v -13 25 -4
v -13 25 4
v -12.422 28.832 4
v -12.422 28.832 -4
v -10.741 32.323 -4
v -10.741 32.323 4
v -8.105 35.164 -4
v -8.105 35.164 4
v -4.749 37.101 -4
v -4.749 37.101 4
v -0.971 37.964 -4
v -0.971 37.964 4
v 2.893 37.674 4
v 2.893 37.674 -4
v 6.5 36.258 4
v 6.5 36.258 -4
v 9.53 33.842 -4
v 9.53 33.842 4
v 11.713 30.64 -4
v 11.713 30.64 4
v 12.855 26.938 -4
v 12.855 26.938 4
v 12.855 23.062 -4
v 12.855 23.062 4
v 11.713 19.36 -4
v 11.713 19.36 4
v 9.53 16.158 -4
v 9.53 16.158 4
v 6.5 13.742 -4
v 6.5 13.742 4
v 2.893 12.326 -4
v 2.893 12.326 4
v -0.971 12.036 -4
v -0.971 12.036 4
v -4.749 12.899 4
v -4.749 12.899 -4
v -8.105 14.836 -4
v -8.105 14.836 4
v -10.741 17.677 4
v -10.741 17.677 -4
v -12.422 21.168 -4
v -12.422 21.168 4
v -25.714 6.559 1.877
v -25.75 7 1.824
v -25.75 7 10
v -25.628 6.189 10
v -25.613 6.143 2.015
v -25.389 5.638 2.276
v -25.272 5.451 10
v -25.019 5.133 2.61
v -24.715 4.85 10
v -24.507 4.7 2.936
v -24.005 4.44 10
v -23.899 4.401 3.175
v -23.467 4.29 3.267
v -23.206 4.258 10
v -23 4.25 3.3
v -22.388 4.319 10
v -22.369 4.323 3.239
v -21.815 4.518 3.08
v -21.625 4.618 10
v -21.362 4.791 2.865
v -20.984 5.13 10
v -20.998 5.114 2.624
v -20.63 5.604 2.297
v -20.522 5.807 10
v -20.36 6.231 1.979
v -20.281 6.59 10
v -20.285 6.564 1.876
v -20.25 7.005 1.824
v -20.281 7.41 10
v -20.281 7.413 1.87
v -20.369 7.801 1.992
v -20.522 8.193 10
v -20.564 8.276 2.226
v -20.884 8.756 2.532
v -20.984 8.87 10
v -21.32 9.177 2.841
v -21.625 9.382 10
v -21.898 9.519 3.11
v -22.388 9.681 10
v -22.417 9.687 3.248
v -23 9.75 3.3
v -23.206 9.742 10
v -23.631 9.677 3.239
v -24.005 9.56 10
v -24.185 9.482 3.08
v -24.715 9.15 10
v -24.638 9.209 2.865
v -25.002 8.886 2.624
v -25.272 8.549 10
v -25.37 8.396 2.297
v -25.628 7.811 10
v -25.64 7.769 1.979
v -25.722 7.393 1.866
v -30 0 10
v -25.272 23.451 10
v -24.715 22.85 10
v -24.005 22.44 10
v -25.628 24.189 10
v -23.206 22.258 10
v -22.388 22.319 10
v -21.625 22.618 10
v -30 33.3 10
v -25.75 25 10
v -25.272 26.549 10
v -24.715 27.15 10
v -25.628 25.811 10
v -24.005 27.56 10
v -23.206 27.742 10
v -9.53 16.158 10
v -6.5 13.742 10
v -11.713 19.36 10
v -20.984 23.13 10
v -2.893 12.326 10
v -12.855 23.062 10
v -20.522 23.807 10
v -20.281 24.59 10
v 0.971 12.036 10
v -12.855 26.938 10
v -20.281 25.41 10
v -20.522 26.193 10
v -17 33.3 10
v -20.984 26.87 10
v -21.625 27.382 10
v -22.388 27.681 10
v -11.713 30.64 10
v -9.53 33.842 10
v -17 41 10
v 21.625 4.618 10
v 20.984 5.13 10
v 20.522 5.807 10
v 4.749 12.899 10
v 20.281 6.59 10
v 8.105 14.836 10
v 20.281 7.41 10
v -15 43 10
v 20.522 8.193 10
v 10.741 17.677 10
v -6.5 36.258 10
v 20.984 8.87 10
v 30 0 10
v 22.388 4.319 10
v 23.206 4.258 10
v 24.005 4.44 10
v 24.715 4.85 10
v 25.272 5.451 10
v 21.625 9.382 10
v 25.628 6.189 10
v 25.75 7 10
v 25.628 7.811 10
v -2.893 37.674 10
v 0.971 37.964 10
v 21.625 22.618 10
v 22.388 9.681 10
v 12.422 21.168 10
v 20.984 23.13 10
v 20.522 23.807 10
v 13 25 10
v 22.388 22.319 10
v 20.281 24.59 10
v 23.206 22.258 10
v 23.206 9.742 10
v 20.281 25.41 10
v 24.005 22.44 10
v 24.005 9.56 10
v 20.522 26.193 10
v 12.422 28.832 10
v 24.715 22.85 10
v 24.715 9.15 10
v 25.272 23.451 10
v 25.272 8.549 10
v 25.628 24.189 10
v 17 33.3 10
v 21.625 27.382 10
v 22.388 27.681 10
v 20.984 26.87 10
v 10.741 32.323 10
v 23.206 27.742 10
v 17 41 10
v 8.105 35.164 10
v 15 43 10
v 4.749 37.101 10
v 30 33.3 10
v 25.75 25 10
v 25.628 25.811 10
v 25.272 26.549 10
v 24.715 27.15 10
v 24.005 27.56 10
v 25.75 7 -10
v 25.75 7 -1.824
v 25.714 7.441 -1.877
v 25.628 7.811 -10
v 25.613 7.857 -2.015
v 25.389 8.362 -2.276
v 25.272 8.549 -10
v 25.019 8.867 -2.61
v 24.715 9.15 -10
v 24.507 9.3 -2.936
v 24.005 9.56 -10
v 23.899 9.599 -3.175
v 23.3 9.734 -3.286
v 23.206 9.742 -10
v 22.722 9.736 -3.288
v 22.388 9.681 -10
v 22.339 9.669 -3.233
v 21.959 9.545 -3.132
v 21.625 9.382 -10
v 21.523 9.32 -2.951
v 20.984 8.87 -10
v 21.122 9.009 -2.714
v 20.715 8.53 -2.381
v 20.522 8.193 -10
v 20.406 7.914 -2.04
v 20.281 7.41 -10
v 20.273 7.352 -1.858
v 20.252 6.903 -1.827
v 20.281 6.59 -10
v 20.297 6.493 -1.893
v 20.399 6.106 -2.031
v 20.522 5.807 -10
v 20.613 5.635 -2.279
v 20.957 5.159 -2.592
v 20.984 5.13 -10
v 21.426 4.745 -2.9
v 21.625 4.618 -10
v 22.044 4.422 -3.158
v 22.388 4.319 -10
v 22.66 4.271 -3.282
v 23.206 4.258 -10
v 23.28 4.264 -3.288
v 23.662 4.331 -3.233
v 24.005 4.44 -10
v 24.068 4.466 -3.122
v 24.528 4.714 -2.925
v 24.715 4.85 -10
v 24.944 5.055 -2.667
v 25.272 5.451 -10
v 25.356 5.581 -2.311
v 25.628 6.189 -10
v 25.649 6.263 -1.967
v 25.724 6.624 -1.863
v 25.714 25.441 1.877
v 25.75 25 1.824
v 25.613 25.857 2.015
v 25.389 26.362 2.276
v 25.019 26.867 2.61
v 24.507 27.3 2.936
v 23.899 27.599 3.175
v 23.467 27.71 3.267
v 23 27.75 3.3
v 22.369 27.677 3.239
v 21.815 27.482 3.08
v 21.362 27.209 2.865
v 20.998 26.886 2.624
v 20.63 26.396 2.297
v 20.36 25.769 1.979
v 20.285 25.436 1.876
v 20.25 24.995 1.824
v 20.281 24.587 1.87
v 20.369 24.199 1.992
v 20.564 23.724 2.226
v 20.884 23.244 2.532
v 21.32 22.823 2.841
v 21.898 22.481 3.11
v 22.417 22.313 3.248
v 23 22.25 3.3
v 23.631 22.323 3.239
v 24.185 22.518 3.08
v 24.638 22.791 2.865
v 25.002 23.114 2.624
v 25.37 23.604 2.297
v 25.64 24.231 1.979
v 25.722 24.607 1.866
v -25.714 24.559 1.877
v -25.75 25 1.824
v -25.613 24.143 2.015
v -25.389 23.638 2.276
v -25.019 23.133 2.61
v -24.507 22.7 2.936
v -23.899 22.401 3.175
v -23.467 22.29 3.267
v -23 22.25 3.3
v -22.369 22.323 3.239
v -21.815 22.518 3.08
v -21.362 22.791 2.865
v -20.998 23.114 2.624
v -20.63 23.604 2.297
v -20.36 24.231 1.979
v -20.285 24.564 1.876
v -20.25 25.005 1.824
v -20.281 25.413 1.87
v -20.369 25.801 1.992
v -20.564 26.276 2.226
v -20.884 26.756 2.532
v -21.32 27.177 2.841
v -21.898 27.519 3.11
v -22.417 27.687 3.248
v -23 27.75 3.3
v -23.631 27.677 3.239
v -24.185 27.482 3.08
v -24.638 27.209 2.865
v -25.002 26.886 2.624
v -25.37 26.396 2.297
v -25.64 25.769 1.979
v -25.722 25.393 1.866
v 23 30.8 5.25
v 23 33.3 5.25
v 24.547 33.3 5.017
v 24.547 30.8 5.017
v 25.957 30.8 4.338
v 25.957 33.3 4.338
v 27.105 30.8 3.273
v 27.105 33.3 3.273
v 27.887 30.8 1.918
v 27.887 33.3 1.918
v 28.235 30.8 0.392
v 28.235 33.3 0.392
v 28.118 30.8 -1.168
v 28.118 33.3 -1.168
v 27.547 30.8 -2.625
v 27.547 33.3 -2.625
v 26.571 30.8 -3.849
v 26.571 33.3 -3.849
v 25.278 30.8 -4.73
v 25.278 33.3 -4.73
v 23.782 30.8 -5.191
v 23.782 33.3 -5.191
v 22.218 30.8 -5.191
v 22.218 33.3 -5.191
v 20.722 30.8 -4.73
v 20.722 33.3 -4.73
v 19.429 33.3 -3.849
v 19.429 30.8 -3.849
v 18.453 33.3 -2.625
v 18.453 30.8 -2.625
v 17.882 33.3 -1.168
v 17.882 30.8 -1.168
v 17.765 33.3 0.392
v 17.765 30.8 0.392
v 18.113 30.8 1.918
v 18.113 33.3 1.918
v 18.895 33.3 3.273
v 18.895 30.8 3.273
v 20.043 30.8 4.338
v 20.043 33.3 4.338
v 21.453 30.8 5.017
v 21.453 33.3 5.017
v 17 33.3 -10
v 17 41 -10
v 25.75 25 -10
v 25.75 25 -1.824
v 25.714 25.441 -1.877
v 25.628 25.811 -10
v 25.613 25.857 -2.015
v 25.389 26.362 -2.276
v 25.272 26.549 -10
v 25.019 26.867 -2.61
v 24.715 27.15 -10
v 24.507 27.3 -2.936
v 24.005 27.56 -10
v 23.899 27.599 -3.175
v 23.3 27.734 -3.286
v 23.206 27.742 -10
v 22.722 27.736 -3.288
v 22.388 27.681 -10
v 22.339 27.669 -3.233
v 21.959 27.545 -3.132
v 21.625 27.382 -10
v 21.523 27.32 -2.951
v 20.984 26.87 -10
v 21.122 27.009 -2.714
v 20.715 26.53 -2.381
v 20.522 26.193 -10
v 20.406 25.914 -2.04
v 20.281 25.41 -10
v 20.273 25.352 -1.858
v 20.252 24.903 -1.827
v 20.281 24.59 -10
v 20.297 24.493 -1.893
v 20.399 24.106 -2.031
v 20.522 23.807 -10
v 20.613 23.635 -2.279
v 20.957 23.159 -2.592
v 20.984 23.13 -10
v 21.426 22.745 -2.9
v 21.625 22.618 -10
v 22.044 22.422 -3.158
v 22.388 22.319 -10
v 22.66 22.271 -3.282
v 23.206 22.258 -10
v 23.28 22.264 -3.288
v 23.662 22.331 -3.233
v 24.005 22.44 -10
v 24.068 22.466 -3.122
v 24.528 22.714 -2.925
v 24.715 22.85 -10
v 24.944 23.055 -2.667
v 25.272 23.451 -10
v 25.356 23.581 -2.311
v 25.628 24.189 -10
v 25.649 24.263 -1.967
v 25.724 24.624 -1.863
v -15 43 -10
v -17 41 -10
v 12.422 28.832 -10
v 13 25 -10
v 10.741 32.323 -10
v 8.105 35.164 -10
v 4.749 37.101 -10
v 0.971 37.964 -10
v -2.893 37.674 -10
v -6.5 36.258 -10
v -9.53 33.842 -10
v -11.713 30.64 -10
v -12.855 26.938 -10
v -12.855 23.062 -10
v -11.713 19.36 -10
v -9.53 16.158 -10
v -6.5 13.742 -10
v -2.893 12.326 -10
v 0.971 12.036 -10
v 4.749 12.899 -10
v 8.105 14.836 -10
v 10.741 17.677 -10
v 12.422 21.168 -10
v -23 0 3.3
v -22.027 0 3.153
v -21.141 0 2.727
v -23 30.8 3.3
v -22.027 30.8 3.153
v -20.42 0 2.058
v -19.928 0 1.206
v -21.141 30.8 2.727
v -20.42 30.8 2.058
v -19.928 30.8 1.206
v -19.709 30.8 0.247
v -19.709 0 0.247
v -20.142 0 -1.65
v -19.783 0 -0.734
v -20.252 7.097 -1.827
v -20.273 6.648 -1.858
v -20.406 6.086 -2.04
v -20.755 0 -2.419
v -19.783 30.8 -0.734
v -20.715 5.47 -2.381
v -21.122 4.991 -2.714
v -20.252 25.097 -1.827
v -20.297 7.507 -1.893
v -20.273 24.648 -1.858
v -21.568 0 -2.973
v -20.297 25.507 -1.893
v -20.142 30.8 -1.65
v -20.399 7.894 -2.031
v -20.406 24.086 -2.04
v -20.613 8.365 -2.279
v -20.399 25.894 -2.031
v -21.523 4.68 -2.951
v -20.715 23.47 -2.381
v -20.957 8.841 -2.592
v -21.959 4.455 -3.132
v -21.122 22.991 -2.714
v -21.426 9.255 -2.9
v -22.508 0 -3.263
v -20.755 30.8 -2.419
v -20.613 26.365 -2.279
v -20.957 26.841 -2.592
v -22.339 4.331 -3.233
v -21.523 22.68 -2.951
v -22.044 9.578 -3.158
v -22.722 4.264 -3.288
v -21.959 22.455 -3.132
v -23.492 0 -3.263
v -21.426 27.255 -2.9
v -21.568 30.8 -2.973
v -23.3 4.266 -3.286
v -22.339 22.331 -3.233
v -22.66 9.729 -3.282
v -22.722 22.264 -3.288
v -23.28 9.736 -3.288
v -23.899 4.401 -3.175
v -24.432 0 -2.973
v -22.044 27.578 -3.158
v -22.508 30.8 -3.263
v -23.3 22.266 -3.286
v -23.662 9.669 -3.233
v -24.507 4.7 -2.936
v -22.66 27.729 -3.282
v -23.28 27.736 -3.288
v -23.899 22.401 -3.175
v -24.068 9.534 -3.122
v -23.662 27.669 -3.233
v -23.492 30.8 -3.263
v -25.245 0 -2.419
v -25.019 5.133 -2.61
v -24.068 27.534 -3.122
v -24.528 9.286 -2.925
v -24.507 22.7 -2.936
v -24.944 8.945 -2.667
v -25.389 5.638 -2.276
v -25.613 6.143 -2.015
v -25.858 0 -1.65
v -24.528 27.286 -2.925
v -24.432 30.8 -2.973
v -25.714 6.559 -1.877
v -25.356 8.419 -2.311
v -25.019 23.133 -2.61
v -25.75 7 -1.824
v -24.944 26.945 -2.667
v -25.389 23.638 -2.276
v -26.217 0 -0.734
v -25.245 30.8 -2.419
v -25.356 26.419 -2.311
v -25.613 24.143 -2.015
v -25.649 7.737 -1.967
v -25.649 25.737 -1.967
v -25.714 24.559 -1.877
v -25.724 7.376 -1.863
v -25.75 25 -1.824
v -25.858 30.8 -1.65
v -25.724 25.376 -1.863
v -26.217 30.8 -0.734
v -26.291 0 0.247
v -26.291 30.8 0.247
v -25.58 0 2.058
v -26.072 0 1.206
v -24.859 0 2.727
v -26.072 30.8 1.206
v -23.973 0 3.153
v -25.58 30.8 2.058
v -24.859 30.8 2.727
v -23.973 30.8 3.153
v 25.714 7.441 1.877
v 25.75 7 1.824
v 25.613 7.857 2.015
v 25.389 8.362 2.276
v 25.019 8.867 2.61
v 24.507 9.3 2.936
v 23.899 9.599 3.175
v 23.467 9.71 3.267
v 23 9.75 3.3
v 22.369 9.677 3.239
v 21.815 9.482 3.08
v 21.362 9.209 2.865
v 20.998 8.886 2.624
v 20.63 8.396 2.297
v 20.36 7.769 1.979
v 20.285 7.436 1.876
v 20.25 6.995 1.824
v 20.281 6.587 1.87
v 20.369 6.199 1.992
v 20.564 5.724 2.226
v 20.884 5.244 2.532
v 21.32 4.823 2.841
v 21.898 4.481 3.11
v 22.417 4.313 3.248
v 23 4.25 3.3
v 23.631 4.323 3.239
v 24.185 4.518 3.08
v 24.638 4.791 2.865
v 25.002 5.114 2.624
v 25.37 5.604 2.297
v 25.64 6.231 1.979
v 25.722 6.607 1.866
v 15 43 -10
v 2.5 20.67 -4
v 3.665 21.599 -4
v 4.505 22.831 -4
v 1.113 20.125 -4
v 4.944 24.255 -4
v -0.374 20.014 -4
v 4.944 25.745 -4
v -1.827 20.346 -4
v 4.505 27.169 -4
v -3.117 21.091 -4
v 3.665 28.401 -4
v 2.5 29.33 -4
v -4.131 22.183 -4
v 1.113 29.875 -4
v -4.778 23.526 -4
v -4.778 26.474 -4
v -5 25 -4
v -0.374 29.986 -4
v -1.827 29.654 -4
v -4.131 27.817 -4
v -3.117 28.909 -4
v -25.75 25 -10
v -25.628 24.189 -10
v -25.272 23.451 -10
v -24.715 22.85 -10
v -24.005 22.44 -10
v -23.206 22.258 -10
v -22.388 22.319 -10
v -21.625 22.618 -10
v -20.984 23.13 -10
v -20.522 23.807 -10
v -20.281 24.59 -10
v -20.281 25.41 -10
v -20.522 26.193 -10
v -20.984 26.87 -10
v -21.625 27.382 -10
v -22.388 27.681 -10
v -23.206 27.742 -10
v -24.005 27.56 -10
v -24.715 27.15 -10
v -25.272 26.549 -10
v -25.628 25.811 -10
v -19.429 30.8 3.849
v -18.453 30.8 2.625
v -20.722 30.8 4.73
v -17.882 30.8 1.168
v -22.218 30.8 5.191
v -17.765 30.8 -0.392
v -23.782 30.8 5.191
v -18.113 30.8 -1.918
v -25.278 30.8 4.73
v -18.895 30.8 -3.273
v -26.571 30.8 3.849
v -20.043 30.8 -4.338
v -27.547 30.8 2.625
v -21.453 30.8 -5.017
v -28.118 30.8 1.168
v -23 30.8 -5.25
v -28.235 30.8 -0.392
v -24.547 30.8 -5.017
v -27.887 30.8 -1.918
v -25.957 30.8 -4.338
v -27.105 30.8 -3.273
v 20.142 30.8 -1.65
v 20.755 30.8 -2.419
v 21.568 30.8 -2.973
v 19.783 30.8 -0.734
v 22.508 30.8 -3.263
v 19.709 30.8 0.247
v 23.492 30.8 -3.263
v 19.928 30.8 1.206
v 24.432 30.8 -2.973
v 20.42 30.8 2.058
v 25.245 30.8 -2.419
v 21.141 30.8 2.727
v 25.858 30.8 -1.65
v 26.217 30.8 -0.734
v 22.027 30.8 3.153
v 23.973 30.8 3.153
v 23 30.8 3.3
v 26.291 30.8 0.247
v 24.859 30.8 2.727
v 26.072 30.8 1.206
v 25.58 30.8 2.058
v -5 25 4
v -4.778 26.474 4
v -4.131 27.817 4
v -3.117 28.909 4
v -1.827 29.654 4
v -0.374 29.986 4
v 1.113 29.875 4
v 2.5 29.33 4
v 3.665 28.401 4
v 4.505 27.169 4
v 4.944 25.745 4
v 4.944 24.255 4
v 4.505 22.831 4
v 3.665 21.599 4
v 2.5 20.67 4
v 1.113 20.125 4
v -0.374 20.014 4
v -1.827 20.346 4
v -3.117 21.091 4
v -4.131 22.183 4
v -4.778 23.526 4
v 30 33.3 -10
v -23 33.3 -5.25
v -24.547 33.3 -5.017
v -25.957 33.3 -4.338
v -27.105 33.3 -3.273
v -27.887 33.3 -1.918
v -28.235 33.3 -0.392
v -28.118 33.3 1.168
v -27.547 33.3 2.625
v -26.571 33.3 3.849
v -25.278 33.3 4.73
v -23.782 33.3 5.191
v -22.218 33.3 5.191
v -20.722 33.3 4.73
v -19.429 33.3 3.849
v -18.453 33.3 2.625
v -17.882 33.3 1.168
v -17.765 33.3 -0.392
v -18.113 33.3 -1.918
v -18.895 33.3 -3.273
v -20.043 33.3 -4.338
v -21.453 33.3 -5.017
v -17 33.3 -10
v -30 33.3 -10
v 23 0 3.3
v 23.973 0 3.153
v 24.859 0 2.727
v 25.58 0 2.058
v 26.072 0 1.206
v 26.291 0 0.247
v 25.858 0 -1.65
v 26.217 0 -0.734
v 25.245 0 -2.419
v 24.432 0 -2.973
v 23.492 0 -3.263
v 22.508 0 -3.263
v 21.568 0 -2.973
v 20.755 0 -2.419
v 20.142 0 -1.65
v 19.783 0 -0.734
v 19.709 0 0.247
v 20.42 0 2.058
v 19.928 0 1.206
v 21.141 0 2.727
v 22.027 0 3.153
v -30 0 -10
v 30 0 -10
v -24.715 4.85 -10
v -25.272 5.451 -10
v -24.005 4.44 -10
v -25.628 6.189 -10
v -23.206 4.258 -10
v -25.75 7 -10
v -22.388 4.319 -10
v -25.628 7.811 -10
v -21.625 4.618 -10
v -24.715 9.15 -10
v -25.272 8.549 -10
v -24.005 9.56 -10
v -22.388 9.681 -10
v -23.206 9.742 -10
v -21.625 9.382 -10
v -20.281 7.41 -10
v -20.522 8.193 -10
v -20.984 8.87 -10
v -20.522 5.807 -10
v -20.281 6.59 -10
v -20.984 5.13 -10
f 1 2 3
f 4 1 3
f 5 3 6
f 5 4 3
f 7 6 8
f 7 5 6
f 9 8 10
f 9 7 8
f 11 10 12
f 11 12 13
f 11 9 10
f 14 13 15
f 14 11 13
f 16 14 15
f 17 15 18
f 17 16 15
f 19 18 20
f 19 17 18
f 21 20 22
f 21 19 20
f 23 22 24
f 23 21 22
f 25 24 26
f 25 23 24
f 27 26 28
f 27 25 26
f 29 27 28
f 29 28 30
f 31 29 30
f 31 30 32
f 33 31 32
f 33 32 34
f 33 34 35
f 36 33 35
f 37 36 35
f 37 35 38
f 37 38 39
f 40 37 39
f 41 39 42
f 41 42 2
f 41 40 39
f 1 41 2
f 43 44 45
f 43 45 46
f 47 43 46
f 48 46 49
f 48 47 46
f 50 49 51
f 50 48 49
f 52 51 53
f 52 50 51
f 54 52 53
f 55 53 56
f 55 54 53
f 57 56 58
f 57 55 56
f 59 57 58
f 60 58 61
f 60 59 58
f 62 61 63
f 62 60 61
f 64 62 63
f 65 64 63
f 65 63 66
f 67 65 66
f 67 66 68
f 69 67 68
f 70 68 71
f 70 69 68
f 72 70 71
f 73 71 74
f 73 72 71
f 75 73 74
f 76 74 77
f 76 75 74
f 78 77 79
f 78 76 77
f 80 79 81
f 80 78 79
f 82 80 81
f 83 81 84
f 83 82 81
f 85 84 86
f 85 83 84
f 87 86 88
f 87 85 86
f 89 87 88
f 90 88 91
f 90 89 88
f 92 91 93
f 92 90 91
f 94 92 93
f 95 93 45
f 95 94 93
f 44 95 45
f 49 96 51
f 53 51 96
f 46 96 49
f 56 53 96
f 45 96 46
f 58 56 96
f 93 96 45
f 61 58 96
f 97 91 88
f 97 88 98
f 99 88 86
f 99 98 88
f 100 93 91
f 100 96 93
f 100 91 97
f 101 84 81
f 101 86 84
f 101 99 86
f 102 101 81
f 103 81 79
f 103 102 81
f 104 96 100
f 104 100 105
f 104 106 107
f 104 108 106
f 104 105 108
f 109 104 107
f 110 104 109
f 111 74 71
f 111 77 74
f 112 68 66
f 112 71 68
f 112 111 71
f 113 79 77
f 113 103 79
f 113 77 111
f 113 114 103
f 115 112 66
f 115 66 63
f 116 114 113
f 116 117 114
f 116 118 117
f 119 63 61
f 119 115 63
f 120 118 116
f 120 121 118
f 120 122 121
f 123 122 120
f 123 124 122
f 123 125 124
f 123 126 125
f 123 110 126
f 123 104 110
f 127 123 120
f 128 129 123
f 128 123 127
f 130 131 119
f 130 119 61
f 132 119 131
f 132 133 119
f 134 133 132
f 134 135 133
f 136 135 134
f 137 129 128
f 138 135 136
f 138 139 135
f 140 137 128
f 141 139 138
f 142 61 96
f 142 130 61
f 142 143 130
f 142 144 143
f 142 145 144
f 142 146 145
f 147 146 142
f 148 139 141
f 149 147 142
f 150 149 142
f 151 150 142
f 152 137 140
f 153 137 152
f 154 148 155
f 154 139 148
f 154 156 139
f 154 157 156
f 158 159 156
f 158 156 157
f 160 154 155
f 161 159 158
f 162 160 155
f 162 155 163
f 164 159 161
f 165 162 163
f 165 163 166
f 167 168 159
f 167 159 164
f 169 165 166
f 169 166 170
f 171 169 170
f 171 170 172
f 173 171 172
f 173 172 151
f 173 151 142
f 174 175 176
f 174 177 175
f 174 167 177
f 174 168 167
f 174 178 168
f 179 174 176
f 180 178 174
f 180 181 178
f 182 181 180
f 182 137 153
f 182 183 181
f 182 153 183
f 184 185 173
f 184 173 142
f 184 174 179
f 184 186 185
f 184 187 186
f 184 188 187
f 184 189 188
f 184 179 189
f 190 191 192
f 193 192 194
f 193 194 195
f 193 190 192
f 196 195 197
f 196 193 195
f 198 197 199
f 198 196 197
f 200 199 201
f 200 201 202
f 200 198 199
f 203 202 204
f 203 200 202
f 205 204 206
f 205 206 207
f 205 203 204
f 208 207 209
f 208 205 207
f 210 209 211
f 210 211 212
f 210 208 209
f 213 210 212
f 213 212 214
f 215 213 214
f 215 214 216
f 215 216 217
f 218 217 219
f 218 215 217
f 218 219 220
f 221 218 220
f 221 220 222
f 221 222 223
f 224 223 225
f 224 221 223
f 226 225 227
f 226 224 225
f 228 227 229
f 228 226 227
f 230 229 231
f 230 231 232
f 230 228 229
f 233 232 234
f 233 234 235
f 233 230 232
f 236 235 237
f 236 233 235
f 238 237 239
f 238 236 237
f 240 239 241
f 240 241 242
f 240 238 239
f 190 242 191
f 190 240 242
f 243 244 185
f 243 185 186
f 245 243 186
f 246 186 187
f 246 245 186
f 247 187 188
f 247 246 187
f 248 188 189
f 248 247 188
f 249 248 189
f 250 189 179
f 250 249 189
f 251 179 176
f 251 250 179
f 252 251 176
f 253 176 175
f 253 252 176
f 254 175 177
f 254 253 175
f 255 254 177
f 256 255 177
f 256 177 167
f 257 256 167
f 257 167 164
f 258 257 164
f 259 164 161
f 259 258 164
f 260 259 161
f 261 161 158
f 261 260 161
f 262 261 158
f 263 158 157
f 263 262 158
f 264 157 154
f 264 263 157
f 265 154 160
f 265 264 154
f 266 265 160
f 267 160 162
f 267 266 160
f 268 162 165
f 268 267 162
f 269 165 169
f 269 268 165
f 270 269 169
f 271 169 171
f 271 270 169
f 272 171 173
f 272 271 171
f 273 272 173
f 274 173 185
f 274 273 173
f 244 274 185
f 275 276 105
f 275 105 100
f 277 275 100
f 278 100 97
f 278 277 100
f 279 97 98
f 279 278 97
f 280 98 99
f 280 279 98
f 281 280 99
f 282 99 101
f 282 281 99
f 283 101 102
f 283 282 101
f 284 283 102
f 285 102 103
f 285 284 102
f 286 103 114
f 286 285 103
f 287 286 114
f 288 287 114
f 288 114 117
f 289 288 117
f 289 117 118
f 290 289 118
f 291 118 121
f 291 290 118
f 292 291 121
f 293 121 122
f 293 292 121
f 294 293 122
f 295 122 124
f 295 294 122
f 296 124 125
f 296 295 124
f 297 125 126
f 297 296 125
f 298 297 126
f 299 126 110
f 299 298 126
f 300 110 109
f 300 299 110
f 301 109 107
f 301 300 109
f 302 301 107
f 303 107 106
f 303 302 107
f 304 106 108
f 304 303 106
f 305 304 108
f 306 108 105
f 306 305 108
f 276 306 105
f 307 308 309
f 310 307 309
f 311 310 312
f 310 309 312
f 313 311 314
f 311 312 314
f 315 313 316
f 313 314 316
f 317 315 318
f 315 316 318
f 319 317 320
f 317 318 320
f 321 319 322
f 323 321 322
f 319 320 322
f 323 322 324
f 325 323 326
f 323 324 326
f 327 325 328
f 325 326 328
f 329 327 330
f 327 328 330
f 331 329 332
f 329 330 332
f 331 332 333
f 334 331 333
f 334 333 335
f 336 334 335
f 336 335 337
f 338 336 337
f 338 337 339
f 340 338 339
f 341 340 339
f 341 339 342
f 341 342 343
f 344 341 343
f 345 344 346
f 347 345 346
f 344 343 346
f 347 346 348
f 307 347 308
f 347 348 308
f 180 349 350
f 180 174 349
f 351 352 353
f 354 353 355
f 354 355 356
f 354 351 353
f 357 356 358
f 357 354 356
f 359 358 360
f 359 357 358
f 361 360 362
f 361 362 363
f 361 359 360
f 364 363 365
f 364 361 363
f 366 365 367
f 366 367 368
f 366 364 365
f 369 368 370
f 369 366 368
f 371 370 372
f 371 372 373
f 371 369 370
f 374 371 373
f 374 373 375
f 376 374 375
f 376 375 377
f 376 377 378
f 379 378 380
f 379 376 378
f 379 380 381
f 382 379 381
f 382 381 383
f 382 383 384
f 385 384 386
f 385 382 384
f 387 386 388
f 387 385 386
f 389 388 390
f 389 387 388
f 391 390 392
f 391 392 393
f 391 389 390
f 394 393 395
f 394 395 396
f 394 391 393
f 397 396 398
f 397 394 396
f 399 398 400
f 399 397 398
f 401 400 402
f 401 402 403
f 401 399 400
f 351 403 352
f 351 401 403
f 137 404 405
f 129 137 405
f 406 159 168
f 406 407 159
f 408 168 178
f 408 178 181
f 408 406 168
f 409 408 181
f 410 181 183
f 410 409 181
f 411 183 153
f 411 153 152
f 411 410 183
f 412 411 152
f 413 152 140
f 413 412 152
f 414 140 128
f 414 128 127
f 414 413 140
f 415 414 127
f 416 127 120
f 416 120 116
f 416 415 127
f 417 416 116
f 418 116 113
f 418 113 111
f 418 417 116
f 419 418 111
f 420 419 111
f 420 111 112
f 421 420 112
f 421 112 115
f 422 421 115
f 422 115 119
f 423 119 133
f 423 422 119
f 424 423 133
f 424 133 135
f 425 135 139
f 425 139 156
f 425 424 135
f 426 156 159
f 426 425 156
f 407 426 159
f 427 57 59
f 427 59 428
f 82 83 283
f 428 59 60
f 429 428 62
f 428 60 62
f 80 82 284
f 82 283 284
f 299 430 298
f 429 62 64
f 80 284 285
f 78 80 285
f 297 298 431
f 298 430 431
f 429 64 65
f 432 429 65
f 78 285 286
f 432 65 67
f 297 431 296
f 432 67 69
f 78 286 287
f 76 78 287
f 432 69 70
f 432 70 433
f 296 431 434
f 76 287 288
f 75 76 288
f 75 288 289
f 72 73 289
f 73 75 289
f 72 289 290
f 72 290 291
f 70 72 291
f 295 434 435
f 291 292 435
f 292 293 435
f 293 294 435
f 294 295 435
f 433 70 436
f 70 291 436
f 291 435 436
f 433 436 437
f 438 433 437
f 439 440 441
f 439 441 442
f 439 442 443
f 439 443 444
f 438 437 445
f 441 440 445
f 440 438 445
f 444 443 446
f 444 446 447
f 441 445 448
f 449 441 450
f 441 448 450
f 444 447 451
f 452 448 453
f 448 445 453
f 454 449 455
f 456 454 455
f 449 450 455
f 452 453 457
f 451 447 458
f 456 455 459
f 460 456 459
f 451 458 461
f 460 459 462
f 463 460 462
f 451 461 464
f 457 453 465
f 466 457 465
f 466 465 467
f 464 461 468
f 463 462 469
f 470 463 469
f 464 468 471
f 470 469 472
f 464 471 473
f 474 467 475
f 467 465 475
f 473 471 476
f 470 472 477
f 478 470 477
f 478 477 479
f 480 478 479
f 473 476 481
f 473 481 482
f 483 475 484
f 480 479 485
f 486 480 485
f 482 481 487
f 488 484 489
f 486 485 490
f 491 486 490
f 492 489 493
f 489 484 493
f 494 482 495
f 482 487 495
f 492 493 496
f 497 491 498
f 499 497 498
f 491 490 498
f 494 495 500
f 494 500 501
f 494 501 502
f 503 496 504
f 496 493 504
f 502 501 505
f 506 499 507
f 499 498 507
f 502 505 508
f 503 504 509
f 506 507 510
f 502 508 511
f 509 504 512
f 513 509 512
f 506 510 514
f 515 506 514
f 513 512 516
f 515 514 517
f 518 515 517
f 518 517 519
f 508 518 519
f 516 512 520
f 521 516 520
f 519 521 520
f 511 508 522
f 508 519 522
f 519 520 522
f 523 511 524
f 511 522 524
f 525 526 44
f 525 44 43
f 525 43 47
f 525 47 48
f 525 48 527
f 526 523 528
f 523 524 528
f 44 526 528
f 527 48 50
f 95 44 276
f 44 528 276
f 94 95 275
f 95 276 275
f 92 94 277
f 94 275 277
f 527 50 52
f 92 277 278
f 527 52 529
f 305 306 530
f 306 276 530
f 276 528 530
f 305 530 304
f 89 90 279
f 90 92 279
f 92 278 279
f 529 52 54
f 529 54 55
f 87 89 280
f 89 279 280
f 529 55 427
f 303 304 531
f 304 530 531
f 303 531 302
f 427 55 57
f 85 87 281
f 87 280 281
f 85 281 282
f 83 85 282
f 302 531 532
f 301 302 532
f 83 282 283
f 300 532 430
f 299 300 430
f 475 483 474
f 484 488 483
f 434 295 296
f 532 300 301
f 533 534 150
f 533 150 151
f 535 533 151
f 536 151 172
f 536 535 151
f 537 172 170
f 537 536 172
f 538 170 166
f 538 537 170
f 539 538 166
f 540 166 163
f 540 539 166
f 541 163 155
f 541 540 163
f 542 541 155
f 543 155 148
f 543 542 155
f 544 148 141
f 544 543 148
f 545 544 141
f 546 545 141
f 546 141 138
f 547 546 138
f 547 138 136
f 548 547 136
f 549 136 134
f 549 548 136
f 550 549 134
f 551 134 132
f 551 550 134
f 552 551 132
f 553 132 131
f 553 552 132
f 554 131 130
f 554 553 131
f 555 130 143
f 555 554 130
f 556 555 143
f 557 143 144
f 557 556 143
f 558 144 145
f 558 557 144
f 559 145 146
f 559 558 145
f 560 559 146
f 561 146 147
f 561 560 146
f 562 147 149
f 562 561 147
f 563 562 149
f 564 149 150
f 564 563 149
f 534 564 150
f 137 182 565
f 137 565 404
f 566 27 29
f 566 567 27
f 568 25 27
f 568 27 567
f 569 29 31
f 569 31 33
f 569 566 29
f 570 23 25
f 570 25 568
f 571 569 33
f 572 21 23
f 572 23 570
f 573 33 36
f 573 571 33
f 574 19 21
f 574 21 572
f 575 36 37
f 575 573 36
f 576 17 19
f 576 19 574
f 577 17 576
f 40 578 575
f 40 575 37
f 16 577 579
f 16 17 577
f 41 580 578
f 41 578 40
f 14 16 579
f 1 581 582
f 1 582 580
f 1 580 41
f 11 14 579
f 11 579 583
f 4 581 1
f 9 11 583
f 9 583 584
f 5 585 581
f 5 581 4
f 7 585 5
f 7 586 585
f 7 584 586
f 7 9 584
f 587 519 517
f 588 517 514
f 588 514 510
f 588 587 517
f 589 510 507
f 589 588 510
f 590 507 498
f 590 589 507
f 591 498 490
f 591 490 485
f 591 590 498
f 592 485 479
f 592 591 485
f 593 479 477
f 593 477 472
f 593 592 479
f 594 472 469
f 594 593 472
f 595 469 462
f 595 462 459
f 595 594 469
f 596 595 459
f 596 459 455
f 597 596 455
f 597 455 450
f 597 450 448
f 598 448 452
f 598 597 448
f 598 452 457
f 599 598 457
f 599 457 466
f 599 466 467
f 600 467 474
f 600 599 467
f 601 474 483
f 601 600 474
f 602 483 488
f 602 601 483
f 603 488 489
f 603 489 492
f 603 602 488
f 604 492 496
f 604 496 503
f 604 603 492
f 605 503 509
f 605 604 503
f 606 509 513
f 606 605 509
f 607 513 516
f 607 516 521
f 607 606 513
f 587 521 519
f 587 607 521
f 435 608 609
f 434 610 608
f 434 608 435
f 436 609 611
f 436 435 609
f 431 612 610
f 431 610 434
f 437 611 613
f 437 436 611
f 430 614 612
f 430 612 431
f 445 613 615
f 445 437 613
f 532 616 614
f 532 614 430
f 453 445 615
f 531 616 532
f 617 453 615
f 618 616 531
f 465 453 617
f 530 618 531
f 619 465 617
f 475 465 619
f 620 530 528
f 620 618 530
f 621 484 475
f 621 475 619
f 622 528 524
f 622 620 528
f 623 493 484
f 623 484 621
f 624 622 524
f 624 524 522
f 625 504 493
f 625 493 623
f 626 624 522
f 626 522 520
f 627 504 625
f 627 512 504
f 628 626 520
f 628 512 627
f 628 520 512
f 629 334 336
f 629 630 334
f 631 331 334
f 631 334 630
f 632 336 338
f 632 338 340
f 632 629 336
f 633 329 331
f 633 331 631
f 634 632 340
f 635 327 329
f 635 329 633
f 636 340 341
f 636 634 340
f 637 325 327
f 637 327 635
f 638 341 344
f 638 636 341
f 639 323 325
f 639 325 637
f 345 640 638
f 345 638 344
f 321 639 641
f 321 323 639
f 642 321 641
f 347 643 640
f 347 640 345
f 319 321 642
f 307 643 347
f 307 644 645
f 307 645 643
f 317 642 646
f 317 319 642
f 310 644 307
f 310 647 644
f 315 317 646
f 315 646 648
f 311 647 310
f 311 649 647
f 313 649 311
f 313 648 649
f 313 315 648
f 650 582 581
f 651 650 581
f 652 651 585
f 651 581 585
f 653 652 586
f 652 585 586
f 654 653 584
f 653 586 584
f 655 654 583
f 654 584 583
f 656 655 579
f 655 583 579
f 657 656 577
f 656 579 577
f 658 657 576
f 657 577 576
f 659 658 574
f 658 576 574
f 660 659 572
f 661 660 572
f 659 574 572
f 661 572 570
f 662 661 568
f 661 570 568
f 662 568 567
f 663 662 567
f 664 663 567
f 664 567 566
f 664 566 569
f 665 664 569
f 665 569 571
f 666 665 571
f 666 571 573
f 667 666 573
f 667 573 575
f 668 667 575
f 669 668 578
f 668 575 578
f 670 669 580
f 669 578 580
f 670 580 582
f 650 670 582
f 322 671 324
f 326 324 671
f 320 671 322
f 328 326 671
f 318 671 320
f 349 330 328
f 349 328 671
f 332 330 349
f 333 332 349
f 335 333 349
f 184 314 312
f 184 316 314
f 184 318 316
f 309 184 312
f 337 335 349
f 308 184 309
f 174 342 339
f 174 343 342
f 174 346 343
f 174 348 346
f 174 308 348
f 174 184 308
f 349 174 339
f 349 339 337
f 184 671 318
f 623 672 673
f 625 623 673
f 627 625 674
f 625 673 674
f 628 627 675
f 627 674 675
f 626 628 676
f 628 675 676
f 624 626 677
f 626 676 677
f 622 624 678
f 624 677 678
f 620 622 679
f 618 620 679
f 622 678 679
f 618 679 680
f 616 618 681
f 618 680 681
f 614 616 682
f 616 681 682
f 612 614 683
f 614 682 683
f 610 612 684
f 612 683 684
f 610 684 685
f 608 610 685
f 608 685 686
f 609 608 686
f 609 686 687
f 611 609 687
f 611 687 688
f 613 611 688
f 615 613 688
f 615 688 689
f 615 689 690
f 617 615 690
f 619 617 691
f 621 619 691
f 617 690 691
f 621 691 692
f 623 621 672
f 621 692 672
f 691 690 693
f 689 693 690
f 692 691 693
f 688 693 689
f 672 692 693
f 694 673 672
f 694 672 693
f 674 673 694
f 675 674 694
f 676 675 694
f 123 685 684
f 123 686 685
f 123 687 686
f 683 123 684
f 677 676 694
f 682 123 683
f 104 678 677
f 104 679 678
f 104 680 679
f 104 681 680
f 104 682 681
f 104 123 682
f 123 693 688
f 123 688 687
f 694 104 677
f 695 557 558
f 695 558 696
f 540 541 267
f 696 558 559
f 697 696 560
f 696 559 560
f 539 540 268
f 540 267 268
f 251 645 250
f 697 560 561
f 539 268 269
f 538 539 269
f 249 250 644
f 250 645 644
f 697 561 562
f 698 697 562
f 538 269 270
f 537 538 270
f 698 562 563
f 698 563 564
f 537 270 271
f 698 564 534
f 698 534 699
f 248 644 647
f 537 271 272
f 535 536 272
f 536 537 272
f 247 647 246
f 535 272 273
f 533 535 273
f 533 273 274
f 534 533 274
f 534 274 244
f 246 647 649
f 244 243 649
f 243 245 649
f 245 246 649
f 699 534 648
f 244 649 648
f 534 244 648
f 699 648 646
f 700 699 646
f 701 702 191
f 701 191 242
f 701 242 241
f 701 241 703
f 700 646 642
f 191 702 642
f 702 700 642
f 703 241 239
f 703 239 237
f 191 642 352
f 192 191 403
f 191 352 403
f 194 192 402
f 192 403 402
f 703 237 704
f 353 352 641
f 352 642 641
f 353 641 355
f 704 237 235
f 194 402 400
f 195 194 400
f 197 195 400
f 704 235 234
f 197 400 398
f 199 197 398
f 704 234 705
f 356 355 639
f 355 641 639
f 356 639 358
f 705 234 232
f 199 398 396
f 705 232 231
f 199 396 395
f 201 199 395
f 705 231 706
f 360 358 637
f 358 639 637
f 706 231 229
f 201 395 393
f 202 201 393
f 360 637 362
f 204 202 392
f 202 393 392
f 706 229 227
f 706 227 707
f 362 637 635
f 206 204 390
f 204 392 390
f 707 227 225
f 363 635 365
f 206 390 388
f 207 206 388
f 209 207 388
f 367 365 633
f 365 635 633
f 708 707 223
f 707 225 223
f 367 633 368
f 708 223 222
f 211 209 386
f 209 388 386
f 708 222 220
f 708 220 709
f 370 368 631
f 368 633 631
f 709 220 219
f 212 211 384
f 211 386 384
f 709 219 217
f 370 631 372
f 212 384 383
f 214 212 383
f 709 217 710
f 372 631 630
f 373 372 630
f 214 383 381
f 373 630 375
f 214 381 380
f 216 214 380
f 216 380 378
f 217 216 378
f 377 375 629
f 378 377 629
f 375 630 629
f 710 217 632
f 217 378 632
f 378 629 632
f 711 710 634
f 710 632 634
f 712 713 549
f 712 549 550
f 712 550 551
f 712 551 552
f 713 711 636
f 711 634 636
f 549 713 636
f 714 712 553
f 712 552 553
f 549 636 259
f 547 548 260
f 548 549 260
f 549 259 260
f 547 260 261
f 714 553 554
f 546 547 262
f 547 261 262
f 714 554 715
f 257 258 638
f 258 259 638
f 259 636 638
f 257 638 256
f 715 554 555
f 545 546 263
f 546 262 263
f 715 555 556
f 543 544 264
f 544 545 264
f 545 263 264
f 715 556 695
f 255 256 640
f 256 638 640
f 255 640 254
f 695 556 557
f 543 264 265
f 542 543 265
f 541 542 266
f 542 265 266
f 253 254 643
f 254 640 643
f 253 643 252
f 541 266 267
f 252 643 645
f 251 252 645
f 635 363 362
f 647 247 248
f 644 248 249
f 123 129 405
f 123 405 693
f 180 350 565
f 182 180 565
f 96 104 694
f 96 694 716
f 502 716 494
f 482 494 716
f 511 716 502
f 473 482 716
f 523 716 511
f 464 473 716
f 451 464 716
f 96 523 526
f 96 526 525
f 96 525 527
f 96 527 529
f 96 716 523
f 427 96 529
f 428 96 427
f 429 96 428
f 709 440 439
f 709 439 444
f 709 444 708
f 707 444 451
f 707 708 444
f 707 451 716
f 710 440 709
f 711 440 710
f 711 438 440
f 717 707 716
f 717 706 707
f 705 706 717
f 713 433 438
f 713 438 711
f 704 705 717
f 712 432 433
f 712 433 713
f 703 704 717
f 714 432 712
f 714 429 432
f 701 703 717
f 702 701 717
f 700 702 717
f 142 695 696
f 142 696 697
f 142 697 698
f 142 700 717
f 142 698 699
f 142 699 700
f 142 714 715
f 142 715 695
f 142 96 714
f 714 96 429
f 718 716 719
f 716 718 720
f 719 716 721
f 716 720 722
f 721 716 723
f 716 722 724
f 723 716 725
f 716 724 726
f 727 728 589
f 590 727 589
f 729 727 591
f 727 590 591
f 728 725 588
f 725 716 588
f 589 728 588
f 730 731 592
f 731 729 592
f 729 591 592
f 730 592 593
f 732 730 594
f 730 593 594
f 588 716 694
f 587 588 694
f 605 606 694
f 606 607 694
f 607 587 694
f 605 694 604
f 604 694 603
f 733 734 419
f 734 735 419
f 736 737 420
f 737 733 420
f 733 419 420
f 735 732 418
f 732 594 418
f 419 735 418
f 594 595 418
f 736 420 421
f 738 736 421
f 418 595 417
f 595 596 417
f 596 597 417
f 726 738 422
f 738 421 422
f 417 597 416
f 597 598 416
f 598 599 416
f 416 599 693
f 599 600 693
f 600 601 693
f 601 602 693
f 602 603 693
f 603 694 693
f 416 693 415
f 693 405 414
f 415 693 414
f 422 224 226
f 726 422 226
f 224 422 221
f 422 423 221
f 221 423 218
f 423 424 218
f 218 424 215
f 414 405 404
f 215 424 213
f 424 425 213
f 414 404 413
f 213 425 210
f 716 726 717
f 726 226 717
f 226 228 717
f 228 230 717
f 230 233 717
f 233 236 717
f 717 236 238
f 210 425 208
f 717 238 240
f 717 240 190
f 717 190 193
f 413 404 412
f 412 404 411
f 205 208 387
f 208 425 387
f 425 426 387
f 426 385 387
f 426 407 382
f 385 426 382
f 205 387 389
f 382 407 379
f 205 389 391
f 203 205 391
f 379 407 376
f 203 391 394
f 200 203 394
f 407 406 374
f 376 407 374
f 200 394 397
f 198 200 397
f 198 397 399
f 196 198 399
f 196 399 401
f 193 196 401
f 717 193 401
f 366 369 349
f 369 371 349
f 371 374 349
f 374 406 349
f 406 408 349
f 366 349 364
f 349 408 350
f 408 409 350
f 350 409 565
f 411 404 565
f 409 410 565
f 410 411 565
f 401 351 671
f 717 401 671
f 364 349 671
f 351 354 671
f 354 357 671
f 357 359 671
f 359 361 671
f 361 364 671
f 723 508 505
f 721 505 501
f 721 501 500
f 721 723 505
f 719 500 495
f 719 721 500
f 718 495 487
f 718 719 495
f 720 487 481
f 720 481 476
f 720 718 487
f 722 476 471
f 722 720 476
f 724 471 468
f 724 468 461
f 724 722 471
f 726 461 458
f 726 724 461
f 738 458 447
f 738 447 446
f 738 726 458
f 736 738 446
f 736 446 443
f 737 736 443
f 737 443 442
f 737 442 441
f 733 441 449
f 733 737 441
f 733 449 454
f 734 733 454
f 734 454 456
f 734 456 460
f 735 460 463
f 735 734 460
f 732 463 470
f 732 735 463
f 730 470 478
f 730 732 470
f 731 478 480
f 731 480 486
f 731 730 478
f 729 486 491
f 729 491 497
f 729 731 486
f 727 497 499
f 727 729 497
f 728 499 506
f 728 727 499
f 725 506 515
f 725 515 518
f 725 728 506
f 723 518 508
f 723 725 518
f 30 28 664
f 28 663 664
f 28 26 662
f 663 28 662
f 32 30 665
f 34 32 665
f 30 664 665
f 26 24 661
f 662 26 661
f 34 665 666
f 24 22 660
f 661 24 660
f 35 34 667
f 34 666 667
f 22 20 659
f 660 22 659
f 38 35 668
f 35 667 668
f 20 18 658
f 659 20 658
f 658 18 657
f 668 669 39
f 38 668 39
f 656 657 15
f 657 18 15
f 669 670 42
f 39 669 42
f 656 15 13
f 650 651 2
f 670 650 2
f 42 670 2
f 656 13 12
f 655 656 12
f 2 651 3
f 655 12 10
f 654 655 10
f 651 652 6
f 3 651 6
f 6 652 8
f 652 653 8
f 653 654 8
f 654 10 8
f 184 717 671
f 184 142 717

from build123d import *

# Parameters (mm, degrees)
SKIZZE1_R                       = 13
SKIZZE1_R_2                     = 2.75
AUFSATZ_LINEAR_AUSTRAGEN1_DEPTH = 10
AUFSATZ_LINEAR_START            = -6
SKIZZE2_R                       = 13
SKIZZE2_R_2                     = 5
AUFSATZ_LINEAR_AUSTRAGEN2_DEPTH = 8
SKIZZE3_R                       = 3.3
SCHNITT_LINEAR_AUSTRAGEN1_DEPTH = 60
SKIZZE4_R                       = 5.25
SCHNITT_LINEAR_AUSTRAGEN2_DEPTH = 2.5


with BuildPart() as part:
    # Skizze1 → Aufsatz-Linear austragen1 (new, symmetric)
    with BuildSketch(Plane.XY):
        Polygon((17, 41), (15, 43), (-15, 43), (-17, 41), (-17, 33.3), (-30, 33.3), (-30, 0), (30, 0), (30, 33.3), (17, 33.3), align=None)
        with Locations((0, 25)):
            Circle(SKIZZE1_R, mode=Mode.SUBTRACT)
        with Locations((23, 25)):
            Circle(SKIZZE1_R_2, mode=Mode.SUBTRACT)
        with Locations((23, 7)):
            Circle(SKIZZE1_R_2, mode=Mode.SUBTRACT)
        with Locations(Location((-23, 25, 0), (0, 0, 180))):
            Circle(SKIZZE1_R_2, mode=Mode.SUBTRACT)
        with Locations(Location((-23, 7, 0), (0, 0, 180))):
            Circle(SKIZZE1_R_2, mode=Mode.SUBTRACT)
    extrude(amount=AUFSATZ_LINEAR_AUSTRAGEN1_DEPTH, both=True)

    # Skizze3 → Schnitt-Linear austragen1 (cut)
    with BuildSketch(Plane(origin=(0, 33.3, 0), x_dir=(1, 0, 0), z_dir=(0, 1, 0))):
        with Locations(Location((23, 0, 0), (0, 0, 270))):
            Circle(SKIZZE3_R)
        with Locations(Location((-23, 0, 0), (0, 0, 270))):
            Circle(SKIZZE3_R)
    extrude(amount=-SCHNITT_LINEAR_AUSTRAGEN1_DEPTH, mode=Mode.SUBTRACT)

    # Skizze4 → Schnitt-Linear austragen2 (cut)
    with BuildSketch(Plane(origin=(0, 33.3, 0), x_dir=(1, 0, 0), z_dir=(0, 1, 0))):
        with Locations(Location((23, 0, 0), (0, 0, 270))):
            Circle(SKIZZE4_R)
        with Locations(Location((-23, 0, 0), (0, 0, 90))):
            Circle(SKIZZE4_R)
    extrude(amount=-SCHNITT_LINEAR_AUSTRAGEN2_DEPTH, mode=Mode.SUBTRACT)


with BuildPart() as body_2:
    # Skizze2 → Aufsatz-Linear austragen2 (new body)
    with BuildSketch(Plane(origin=(0, 0, -10), x_dir=(-1, 0, 0), z_dir=(0, 0, -1)).offset(AUFSATZ_LINEAR_START)):
        with Locations((0, 25)):
            Circle(SKIZZE2_R)
        with Locations((0, 25)):
            Circle(SKIZZE2_R_2, mode=Mode.SUBTRACT)
    extrude(amount=-AUFSATZ_LINEAR_AUSTRAGEN2_DEPTH)


solid = Compound([part.part, body_2.part])
